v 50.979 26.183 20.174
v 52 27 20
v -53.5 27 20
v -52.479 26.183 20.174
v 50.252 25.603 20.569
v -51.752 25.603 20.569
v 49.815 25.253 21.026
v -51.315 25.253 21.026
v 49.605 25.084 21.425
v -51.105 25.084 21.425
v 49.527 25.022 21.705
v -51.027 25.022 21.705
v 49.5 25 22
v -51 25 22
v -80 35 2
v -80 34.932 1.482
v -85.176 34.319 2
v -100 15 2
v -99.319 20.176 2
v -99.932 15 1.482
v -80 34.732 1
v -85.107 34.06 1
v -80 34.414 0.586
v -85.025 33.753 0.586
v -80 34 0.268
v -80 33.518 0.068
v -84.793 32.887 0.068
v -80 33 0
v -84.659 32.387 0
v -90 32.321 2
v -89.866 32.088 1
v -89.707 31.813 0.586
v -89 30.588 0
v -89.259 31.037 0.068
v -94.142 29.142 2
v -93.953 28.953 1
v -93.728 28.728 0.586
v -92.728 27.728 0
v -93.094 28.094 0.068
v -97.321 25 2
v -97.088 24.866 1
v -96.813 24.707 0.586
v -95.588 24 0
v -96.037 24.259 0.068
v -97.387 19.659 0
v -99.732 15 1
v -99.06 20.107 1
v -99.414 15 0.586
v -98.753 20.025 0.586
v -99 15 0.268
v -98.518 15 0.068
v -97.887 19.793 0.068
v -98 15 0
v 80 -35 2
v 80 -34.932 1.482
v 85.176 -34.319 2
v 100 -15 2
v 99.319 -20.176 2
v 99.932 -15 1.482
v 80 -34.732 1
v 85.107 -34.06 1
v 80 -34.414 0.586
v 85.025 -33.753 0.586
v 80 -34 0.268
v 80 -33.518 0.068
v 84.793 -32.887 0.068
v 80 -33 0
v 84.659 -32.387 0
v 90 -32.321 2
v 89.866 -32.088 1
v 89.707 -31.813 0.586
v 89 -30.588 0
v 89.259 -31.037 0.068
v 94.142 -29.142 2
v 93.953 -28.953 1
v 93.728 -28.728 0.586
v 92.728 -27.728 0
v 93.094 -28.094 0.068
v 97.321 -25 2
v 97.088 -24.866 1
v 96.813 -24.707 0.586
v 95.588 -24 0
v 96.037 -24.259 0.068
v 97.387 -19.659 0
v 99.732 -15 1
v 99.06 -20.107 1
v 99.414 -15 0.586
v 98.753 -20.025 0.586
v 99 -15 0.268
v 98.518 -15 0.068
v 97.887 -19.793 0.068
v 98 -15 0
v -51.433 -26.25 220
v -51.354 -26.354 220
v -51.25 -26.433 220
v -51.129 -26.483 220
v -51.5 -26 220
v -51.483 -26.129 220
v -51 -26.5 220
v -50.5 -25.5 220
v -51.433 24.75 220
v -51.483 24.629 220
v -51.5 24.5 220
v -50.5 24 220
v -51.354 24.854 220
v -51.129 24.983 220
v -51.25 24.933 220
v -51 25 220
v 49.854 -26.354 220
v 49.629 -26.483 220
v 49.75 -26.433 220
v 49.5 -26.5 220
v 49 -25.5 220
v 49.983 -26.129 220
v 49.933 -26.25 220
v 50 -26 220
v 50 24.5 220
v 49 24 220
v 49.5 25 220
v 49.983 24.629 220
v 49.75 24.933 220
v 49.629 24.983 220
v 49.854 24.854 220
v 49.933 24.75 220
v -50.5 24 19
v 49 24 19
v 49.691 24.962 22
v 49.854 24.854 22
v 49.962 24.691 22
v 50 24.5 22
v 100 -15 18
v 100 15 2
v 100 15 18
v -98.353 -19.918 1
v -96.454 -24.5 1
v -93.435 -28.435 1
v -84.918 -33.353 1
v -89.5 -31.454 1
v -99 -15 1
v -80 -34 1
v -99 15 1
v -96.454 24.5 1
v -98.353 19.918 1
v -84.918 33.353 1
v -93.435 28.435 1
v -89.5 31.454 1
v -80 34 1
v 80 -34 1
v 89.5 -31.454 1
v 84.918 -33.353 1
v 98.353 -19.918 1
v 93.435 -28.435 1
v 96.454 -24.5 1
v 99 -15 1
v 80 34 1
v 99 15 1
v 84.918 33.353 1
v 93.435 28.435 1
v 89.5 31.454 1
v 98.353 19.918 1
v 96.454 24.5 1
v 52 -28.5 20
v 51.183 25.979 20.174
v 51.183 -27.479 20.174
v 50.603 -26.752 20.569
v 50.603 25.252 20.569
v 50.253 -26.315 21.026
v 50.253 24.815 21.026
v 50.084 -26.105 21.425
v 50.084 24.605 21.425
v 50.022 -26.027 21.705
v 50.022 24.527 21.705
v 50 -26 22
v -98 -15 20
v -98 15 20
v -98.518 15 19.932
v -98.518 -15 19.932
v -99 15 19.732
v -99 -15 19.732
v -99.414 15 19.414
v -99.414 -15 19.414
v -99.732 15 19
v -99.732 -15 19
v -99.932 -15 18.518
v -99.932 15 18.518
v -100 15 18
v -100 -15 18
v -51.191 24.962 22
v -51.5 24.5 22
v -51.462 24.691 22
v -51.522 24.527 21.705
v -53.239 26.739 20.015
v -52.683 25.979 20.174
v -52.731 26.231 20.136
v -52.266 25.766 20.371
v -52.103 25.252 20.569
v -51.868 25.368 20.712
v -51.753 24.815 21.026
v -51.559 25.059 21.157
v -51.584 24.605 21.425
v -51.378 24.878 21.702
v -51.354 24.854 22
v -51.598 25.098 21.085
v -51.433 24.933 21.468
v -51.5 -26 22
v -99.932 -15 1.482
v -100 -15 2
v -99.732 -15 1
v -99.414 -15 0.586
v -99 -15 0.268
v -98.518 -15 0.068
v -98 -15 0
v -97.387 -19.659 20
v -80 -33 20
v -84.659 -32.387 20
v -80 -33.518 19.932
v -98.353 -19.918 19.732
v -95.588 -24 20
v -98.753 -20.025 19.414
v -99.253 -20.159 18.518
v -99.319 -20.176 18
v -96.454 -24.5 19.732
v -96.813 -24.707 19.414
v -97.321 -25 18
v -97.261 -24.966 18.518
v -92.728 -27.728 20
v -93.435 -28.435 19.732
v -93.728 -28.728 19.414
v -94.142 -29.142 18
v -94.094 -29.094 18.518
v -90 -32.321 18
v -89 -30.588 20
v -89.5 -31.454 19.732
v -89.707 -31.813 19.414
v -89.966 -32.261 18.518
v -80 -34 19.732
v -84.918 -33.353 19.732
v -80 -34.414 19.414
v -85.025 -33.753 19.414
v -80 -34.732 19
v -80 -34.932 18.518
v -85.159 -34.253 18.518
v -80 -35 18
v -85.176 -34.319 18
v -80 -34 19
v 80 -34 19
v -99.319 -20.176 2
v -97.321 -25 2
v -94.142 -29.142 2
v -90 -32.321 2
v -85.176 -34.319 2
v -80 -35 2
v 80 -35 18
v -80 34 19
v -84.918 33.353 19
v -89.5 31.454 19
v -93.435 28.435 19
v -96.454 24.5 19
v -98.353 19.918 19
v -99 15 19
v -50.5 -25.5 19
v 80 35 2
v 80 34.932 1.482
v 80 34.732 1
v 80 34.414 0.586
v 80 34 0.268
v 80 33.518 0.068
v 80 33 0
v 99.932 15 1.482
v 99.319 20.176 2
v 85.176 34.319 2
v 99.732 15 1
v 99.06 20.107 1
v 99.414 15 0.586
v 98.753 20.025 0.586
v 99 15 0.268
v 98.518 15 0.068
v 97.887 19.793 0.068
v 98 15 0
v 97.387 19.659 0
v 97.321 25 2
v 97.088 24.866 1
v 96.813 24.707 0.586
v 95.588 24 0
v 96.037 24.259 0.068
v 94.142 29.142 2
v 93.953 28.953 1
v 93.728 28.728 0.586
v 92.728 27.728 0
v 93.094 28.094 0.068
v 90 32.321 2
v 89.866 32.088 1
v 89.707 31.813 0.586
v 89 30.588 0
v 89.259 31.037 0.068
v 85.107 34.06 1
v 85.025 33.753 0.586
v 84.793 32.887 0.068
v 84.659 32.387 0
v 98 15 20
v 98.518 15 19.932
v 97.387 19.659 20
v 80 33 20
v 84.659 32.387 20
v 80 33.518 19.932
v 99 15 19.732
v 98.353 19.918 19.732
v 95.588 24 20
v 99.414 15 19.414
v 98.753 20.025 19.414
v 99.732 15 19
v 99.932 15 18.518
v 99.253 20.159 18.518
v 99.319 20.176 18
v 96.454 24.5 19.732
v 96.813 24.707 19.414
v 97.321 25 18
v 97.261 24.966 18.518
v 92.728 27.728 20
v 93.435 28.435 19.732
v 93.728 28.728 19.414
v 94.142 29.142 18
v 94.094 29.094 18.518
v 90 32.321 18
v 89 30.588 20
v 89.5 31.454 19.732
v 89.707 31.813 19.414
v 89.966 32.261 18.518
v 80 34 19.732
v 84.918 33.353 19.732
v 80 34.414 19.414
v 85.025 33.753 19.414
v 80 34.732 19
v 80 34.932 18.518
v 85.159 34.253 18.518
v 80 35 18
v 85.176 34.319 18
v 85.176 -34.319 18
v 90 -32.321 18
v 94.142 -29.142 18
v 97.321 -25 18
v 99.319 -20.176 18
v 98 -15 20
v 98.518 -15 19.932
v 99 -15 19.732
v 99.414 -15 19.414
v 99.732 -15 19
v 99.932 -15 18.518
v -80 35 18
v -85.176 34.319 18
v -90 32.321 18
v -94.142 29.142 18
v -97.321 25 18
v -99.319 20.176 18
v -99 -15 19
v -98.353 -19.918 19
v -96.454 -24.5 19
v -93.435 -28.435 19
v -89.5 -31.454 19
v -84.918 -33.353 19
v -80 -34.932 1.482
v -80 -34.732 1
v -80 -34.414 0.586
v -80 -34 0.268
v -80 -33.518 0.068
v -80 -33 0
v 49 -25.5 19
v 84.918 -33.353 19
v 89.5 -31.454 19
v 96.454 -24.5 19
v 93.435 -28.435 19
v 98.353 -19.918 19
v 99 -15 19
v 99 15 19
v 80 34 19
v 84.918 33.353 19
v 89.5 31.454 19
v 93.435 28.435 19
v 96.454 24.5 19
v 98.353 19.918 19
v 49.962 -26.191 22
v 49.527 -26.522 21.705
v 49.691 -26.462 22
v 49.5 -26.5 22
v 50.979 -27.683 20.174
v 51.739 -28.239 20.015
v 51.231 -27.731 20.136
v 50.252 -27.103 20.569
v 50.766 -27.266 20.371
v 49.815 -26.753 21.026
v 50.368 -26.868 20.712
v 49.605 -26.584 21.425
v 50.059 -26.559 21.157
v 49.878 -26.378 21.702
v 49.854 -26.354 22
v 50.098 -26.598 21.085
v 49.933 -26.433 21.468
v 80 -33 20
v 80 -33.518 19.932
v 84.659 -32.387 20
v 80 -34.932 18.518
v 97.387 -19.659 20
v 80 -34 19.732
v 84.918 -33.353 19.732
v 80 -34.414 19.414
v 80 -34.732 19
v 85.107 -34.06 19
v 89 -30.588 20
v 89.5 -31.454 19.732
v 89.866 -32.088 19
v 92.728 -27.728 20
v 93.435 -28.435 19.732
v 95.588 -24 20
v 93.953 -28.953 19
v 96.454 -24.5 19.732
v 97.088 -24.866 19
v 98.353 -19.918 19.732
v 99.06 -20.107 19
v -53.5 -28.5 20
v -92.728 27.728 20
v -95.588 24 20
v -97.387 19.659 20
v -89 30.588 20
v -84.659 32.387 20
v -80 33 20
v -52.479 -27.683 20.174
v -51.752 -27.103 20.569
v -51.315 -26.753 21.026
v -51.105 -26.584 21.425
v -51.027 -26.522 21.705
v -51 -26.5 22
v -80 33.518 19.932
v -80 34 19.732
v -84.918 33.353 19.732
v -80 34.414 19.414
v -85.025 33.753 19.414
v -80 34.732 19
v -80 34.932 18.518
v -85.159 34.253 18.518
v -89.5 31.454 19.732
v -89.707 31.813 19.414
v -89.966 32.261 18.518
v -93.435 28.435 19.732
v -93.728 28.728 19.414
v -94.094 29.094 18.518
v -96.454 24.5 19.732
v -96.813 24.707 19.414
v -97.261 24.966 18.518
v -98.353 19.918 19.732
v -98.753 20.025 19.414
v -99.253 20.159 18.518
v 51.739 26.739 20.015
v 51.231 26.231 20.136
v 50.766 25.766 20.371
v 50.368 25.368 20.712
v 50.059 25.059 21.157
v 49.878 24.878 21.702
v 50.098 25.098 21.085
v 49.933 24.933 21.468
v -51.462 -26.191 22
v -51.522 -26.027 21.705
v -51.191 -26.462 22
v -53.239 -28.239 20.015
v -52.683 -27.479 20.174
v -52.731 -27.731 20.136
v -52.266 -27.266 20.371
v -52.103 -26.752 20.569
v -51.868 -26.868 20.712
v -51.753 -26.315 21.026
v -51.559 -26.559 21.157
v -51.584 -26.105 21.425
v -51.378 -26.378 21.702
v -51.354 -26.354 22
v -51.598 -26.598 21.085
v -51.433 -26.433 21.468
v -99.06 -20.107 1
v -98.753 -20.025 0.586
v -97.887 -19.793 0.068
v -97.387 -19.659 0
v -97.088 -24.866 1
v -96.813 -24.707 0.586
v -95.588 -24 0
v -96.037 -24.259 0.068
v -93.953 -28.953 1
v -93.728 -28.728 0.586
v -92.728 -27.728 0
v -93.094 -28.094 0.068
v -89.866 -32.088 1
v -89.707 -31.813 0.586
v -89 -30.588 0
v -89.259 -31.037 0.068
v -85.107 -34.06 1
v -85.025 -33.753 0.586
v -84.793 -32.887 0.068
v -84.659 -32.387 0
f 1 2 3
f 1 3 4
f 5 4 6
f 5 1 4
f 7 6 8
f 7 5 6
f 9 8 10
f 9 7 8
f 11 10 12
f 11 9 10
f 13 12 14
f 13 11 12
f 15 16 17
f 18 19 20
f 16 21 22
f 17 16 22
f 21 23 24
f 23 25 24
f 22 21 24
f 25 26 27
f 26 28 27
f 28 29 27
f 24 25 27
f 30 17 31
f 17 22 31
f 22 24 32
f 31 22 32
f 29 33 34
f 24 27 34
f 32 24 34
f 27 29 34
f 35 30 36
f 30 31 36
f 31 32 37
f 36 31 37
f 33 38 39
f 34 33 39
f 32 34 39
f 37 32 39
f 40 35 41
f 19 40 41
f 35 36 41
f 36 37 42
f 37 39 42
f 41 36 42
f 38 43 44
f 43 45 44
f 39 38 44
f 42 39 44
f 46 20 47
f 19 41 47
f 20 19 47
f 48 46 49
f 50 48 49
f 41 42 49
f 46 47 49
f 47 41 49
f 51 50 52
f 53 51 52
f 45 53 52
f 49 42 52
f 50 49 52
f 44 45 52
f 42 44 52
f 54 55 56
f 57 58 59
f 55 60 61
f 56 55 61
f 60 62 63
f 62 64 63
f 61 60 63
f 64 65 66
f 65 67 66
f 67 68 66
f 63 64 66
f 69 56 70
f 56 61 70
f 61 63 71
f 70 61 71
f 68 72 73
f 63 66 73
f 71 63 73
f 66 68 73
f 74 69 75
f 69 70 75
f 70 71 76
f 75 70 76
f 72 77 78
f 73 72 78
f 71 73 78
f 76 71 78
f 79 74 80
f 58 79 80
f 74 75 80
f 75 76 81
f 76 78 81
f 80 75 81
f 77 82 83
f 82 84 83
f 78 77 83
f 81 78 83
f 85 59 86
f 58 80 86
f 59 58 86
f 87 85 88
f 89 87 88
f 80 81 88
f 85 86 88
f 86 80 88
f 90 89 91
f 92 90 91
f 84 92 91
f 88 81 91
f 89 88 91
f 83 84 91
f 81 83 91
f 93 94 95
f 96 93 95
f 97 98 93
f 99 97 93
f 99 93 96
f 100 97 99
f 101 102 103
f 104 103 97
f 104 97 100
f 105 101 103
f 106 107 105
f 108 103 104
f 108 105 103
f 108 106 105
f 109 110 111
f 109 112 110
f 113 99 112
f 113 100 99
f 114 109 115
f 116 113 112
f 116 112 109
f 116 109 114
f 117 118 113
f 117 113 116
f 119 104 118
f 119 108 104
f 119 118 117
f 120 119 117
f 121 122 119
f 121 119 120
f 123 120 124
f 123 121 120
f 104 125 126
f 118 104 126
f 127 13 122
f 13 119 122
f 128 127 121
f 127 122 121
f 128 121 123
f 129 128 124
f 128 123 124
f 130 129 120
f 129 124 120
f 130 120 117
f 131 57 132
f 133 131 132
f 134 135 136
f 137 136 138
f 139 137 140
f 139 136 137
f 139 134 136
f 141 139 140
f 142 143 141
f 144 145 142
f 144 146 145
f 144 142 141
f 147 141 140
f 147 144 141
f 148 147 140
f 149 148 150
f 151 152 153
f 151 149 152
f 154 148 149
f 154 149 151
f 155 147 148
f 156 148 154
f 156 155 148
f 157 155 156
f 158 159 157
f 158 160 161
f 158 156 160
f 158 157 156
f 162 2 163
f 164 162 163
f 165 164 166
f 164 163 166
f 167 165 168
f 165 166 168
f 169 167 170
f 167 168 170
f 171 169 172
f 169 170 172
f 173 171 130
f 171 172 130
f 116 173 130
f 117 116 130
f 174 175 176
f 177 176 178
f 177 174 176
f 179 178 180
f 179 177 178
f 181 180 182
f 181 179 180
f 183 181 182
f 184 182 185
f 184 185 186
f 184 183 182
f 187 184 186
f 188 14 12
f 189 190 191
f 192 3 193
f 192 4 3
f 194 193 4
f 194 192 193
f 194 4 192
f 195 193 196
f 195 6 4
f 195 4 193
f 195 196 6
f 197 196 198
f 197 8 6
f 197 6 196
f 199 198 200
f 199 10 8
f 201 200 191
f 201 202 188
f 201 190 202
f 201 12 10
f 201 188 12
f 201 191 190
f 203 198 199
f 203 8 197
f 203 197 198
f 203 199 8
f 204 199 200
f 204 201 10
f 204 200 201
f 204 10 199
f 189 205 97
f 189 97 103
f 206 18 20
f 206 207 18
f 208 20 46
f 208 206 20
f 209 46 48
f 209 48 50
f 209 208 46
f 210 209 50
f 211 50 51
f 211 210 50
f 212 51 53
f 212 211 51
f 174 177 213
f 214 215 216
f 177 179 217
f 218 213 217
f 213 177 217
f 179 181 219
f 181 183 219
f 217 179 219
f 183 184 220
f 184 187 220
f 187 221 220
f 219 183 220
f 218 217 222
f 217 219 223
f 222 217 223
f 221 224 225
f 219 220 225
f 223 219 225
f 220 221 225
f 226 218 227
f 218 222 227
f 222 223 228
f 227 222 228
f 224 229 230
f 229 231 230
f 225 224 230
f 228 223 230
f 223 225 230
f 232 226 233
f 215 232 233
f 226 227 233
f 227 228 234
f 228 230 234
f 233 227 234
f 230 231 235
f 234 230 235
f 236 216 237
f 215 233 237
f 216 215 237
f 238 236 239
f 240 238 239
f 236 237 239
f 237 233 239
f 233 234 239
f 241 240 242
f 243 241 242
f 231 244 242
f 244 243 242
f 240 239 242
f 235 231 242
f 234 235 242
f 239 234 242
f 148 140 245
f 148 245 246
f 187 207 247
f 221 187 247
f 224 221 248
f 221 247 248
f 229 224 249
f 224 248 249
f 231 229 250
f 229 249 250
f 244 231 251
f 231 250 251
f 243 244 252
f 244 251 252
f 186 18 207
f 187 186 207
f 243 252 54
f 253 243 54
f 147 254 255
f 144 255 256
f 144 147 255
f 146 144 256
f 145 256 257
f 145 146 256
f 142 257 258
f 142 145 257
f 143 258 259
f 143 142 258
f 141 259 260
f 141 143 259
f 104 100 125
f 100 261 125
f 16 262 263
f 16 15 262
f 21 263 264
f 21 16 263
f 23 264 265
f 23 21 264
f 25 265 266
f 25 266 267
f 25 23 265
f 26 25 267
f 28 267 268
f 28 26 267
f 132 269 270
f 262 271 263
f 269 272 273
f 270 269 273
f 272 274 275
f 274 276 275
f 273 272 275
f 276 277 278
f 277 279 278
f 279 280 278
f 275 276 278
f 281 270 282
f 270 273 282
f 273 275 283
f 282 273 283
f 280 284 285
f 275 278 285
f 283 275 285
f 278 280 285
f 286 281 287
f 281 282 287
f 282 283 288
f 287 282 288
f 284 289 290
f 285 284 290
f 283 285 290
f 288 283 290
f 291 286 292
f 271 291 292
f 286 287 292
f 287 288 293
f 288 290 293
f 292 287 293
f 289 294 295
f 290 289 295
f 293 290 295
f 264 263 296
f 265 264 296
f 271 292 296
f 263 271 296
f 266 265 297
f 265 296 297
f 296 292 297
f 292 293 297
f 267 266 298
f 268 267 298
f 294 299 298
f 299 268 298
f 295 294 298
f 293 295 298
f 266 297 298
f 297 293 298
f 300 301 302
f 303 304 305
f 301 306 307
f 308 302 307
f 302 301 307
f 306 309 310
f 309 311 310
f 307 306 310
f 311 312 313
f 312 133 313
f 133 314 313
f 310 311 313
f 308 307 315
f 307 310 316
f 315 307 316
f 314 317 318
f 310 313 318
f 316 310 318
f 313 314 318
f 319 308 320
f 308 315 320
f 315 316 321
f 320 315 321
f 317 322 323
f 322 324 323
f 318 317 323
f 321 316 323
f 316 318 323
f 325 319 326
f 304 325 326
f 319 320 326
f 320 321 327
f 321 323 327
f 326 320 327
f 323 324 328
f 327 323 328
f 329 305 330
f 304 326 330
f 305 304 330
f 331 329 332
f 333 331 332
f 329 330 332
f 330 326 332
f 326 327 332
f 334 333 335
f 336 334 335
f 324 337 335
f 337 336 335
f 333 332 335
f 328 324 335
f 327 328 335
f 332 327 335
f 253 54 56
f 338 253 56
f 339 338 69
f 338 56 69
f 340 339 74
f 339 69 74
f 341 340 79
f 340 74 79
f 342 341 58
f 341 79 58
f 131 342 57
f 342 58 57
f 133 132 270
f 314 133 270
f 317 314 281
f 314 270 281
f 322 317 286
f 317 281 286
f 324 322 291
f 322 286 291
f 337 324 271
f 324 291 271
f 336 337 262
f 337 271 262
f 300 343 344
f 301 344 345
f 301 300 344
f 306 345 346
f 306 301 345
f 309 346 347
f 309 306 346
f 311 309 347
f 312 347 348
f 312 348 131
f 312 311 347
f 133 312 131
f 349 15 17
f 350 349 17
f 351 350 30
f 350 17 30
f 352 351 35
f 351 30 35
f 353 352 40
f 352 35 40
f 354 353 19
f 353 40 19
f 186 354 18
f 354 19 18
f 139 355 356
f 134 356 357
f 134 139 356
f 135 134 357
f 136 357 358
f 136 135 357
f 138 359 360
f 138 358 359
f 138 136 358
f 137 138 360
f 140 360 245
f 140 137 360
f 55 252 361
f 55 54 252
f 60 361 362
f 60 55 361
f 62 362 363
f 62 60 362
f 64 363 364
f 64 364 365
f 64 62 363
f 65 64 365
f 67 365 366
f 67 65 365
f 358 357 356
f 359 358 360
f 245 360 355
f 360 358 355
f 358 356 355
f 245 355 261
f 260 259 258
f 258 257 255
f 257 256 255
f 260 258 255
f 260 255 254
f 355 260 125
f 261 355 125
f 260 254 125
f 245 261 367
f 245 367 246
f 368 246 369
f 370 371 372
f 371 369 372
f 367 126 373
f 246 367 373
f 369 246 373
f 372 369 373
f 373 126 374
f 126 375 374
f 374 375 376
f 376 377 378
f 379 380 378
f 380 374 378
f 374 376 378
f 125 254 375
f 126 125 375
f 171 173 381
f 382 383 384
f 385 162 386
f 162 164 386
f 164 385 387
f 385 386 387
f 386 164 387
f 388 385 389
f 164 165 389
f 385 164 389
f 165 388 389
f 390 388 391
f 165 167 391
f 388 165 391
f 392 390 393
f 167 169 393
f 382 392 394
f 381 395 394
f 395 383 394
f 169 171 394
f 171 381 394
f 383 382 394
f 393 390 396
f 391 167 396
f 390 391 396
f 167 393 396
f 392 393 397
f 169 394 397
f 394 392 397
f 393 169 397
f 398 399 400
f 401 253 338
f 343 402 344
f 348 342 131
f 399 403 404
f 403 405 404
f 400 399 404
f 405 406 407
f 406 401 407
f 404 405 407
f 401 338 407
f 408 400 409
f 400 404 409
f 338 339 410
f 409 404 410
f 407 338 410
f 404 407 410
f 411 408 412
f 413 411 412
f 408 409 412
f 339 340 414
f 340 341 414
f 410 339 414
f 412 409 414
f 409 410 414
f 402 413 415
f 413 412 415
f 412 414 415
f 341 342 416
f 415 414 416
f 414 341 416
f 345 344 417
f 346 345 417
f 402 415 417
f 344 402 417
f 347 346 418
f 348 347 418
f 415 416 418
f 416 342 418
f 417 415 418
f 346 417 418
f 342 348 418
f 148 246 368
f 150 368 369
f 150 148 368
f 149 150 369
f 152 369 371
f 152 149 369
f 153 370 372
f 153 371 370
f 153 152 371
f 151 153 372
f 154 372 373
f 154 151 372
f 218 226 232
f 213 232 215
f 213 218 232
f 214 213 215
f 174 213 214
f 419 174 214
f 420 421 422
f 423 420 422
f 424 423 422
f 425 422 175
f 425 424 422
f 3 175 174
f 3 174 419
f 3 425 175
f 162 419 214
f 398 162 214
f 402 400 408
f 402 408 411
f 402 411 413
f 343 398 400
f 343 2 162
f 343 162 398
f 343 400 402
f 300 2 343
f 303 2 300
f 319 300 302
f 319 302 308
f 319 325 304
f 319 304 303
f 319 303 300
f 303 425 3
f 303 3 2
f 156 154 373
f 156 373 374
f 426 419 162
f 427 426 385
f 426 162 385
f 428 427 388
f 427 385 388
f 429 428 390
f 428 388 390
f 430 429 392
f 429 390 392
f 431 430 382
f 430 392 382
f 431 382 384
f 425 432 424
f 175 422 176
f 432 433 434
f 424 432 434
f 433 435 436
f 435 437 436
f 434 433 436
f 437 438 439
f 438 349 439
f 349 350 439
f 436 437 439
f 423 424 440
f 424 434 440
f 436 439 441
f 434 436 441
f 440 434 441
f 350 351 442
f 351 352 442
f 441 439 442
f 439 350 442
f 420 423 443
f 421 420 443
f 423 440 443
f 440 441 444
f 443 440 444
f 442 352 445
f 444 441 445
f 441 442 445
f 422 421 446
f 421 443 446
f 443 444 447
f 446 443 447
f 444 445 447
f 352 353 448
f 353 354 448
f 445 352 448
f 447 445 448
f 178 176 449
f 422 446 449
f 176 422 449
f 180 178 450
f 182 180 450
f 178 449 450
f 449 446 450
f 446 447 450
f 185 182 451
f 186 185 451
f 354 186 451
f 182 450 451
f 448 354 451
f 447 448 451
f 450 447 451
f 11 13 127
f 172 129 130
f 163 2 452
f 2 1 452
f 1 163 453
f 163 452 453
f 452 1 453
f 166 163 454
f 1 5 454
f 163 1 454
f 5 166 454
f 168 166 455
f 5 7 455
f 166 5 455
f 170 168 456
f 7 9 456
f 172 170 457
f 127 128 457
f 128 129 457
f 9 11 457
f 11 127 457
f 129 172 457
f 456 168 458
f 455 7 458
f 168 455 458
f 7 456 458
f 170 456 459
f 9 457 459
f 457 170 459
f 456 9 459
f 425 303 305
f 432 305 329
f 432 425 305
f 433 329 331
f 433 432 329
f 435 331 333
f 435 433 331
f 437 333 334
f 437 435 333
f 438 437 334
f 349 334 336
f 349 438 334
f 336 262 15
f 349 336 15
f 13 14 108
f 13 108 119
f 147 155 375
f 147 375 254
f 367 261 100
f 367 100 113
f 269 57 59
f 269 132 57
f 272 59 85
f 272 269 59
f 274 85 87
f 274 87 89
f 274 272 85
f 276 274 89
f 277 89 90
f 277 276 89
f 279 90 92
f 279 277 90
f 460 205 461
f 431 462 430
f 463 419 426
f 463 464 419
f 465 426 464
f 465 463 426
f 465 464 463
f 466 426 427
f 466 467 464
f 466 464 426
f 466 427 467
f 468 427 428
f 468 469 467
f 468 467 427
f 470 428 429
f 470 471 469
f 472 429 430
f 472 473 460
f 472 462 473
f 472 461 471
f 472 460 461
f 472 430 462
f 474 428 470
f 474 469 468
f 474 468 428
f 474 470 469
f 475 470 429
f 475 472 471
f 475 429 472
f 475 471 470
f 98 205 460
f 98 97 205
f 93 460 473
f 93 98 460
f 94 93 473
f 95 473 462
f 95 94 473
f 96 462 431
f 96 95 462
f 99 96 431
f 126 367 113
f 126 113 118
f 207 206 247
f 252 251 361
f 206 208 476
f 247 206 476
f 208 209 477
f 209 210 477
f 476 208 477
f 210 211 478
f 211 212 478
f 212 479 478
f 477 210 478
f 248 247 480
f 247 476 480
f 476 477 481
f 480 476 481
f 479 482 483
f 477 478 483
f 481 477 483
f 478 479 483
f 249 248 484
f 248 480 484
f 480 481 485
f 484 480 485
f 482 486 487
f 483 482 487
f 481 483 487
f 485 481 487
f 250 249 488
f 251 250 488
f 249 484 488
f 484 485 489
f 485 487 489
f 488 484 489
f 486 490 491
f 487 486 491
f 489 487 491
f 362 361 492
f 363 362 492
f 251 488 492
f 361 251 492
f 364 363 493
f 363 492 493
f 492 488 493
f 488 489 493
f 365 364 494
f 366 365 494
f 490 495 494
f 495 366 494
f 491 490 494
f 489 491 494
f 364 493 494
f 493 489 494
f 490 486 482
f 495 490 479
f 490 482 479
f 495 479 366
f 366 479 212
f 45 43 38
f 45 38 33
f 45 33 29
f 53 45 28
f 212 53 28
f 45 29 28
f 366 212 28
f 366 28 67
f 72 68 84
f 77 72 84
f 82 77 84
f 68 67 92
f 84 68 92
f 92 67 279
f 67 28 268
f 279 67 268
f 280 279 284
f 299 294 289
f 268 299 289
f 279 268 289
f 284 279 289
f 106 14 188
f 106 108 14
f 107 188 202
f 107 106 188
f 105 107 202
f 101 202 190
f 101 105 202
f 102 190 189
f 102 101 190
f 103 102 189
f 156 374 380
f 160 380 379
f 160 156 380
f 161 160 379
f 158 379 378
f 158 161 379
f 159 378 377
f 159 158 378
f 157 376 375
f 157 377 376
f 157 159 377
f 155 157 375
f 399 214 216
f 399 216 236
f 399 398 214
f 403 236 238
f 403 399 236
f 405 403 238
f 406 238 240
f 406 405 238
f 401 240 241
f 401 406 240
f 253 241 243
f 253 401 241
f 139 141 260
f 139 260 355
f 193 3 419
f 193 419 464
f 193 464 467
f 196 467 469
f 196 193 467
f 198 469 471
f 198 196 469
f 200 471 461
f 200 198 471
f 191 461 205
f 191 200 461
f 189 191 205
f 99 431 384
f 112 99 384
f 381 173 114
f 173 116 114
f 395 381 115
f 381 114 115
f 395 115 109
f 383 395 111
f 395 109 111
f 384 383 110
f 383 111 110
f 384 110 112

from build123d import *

# Parameters (mm, degrees)
F1_DEPTH = 20
F2_W     = 101.5
F2_H     = 51.5
F3_DEPTH = 200
F4_T     = -1
F5_R     = 2
F6_R     = 0.5


with BuildPart() as f1:
    # F0 (on Top) → F1 (new body)
    with BuildSketch(Plane.XY):
        with BuildLine():
            Line((80, 35), (-80, 35))
            ThreePointArc((-80, 35), (-94.1421356237, 29.1421356237), (-100, 15))
            Line((-100, 15), (-100, -15))
            ThreePointArc((-100, -15), (-94.1421356237, -29.1421356237), (-80, -35))
            Line((-80, -35), (80, -35))
            ThreePointArc((80, -35), (94.1421356237, -29.1421356237), (100, -15))
            Line((100, -15), (100, 15))
            ThreePointArc((100, 15), (94.1421356237, 29.1421356237), (80, 35))
        make_face()
    extrude(amount=F1_DEPTH)

    # F2 (on face) → F3 (join)
    with BuildSketch(Plane.XY.offset(20)):
        with Locations((-0.75, -0.75)):
            Rectangle(F2_W, F2_H)
    extrude(amount=F3_DEPTH)

    # F4
    f4_openings = [f1.faces().sort_by_distance(p)[0] for p in [
        (-0.75, -0.75, 220),
    ]]
    offset(amount=F4_T, openings=f4_openings, kind=Kind.INTERSECTION)

    # F5
    f5_edges = [f1.edges().sort_by_distance(p)[0] for p in [
        (94.142136, -29.142136, 20),
        (100, 0, 20),
        (94.142136, 29.142136, 20),
        (0, -35, 20),
        (0, 35, 20),
        (-94.142136, -29.142136, 20),
        (-94.142136, 29.142136, 20),
        (-100, 0, 20),
        (-0.75, 25, 20),
        (-51.5, -0.75, 20),
        (-0.75, -26.5, 20),
        (50, -0.75, 20),
        (100, 15, 10),
        (80, 35, 10),
        (94.142136, 29.142136, 0),
        (-80, 35, 10),
        (0, 35, 0),
        (-100, 15, 10),
        (-94.142136, 29.142136, 0),
        (-100, -15, 10),
        (-100, 0, 0),
        (-80, -35, 10),
        (-94.142136, -29.142136, 0),
        (80, -35, 10),
        (0, -35, 0),
    ]]
    fillet(f5_edges, radius=F5_R)

    # F6
    f6_edges = [f1.edges().sort_by_distance(p)[0] for p in [
        (-51.5, -26.5, 121),
        (-51.5, 25, 121),
        (50, -26.5, 121),
        (50, 25, 121),
    ]]
    fillet(f6_edges, radius=F6_R)


solid = f1.part
